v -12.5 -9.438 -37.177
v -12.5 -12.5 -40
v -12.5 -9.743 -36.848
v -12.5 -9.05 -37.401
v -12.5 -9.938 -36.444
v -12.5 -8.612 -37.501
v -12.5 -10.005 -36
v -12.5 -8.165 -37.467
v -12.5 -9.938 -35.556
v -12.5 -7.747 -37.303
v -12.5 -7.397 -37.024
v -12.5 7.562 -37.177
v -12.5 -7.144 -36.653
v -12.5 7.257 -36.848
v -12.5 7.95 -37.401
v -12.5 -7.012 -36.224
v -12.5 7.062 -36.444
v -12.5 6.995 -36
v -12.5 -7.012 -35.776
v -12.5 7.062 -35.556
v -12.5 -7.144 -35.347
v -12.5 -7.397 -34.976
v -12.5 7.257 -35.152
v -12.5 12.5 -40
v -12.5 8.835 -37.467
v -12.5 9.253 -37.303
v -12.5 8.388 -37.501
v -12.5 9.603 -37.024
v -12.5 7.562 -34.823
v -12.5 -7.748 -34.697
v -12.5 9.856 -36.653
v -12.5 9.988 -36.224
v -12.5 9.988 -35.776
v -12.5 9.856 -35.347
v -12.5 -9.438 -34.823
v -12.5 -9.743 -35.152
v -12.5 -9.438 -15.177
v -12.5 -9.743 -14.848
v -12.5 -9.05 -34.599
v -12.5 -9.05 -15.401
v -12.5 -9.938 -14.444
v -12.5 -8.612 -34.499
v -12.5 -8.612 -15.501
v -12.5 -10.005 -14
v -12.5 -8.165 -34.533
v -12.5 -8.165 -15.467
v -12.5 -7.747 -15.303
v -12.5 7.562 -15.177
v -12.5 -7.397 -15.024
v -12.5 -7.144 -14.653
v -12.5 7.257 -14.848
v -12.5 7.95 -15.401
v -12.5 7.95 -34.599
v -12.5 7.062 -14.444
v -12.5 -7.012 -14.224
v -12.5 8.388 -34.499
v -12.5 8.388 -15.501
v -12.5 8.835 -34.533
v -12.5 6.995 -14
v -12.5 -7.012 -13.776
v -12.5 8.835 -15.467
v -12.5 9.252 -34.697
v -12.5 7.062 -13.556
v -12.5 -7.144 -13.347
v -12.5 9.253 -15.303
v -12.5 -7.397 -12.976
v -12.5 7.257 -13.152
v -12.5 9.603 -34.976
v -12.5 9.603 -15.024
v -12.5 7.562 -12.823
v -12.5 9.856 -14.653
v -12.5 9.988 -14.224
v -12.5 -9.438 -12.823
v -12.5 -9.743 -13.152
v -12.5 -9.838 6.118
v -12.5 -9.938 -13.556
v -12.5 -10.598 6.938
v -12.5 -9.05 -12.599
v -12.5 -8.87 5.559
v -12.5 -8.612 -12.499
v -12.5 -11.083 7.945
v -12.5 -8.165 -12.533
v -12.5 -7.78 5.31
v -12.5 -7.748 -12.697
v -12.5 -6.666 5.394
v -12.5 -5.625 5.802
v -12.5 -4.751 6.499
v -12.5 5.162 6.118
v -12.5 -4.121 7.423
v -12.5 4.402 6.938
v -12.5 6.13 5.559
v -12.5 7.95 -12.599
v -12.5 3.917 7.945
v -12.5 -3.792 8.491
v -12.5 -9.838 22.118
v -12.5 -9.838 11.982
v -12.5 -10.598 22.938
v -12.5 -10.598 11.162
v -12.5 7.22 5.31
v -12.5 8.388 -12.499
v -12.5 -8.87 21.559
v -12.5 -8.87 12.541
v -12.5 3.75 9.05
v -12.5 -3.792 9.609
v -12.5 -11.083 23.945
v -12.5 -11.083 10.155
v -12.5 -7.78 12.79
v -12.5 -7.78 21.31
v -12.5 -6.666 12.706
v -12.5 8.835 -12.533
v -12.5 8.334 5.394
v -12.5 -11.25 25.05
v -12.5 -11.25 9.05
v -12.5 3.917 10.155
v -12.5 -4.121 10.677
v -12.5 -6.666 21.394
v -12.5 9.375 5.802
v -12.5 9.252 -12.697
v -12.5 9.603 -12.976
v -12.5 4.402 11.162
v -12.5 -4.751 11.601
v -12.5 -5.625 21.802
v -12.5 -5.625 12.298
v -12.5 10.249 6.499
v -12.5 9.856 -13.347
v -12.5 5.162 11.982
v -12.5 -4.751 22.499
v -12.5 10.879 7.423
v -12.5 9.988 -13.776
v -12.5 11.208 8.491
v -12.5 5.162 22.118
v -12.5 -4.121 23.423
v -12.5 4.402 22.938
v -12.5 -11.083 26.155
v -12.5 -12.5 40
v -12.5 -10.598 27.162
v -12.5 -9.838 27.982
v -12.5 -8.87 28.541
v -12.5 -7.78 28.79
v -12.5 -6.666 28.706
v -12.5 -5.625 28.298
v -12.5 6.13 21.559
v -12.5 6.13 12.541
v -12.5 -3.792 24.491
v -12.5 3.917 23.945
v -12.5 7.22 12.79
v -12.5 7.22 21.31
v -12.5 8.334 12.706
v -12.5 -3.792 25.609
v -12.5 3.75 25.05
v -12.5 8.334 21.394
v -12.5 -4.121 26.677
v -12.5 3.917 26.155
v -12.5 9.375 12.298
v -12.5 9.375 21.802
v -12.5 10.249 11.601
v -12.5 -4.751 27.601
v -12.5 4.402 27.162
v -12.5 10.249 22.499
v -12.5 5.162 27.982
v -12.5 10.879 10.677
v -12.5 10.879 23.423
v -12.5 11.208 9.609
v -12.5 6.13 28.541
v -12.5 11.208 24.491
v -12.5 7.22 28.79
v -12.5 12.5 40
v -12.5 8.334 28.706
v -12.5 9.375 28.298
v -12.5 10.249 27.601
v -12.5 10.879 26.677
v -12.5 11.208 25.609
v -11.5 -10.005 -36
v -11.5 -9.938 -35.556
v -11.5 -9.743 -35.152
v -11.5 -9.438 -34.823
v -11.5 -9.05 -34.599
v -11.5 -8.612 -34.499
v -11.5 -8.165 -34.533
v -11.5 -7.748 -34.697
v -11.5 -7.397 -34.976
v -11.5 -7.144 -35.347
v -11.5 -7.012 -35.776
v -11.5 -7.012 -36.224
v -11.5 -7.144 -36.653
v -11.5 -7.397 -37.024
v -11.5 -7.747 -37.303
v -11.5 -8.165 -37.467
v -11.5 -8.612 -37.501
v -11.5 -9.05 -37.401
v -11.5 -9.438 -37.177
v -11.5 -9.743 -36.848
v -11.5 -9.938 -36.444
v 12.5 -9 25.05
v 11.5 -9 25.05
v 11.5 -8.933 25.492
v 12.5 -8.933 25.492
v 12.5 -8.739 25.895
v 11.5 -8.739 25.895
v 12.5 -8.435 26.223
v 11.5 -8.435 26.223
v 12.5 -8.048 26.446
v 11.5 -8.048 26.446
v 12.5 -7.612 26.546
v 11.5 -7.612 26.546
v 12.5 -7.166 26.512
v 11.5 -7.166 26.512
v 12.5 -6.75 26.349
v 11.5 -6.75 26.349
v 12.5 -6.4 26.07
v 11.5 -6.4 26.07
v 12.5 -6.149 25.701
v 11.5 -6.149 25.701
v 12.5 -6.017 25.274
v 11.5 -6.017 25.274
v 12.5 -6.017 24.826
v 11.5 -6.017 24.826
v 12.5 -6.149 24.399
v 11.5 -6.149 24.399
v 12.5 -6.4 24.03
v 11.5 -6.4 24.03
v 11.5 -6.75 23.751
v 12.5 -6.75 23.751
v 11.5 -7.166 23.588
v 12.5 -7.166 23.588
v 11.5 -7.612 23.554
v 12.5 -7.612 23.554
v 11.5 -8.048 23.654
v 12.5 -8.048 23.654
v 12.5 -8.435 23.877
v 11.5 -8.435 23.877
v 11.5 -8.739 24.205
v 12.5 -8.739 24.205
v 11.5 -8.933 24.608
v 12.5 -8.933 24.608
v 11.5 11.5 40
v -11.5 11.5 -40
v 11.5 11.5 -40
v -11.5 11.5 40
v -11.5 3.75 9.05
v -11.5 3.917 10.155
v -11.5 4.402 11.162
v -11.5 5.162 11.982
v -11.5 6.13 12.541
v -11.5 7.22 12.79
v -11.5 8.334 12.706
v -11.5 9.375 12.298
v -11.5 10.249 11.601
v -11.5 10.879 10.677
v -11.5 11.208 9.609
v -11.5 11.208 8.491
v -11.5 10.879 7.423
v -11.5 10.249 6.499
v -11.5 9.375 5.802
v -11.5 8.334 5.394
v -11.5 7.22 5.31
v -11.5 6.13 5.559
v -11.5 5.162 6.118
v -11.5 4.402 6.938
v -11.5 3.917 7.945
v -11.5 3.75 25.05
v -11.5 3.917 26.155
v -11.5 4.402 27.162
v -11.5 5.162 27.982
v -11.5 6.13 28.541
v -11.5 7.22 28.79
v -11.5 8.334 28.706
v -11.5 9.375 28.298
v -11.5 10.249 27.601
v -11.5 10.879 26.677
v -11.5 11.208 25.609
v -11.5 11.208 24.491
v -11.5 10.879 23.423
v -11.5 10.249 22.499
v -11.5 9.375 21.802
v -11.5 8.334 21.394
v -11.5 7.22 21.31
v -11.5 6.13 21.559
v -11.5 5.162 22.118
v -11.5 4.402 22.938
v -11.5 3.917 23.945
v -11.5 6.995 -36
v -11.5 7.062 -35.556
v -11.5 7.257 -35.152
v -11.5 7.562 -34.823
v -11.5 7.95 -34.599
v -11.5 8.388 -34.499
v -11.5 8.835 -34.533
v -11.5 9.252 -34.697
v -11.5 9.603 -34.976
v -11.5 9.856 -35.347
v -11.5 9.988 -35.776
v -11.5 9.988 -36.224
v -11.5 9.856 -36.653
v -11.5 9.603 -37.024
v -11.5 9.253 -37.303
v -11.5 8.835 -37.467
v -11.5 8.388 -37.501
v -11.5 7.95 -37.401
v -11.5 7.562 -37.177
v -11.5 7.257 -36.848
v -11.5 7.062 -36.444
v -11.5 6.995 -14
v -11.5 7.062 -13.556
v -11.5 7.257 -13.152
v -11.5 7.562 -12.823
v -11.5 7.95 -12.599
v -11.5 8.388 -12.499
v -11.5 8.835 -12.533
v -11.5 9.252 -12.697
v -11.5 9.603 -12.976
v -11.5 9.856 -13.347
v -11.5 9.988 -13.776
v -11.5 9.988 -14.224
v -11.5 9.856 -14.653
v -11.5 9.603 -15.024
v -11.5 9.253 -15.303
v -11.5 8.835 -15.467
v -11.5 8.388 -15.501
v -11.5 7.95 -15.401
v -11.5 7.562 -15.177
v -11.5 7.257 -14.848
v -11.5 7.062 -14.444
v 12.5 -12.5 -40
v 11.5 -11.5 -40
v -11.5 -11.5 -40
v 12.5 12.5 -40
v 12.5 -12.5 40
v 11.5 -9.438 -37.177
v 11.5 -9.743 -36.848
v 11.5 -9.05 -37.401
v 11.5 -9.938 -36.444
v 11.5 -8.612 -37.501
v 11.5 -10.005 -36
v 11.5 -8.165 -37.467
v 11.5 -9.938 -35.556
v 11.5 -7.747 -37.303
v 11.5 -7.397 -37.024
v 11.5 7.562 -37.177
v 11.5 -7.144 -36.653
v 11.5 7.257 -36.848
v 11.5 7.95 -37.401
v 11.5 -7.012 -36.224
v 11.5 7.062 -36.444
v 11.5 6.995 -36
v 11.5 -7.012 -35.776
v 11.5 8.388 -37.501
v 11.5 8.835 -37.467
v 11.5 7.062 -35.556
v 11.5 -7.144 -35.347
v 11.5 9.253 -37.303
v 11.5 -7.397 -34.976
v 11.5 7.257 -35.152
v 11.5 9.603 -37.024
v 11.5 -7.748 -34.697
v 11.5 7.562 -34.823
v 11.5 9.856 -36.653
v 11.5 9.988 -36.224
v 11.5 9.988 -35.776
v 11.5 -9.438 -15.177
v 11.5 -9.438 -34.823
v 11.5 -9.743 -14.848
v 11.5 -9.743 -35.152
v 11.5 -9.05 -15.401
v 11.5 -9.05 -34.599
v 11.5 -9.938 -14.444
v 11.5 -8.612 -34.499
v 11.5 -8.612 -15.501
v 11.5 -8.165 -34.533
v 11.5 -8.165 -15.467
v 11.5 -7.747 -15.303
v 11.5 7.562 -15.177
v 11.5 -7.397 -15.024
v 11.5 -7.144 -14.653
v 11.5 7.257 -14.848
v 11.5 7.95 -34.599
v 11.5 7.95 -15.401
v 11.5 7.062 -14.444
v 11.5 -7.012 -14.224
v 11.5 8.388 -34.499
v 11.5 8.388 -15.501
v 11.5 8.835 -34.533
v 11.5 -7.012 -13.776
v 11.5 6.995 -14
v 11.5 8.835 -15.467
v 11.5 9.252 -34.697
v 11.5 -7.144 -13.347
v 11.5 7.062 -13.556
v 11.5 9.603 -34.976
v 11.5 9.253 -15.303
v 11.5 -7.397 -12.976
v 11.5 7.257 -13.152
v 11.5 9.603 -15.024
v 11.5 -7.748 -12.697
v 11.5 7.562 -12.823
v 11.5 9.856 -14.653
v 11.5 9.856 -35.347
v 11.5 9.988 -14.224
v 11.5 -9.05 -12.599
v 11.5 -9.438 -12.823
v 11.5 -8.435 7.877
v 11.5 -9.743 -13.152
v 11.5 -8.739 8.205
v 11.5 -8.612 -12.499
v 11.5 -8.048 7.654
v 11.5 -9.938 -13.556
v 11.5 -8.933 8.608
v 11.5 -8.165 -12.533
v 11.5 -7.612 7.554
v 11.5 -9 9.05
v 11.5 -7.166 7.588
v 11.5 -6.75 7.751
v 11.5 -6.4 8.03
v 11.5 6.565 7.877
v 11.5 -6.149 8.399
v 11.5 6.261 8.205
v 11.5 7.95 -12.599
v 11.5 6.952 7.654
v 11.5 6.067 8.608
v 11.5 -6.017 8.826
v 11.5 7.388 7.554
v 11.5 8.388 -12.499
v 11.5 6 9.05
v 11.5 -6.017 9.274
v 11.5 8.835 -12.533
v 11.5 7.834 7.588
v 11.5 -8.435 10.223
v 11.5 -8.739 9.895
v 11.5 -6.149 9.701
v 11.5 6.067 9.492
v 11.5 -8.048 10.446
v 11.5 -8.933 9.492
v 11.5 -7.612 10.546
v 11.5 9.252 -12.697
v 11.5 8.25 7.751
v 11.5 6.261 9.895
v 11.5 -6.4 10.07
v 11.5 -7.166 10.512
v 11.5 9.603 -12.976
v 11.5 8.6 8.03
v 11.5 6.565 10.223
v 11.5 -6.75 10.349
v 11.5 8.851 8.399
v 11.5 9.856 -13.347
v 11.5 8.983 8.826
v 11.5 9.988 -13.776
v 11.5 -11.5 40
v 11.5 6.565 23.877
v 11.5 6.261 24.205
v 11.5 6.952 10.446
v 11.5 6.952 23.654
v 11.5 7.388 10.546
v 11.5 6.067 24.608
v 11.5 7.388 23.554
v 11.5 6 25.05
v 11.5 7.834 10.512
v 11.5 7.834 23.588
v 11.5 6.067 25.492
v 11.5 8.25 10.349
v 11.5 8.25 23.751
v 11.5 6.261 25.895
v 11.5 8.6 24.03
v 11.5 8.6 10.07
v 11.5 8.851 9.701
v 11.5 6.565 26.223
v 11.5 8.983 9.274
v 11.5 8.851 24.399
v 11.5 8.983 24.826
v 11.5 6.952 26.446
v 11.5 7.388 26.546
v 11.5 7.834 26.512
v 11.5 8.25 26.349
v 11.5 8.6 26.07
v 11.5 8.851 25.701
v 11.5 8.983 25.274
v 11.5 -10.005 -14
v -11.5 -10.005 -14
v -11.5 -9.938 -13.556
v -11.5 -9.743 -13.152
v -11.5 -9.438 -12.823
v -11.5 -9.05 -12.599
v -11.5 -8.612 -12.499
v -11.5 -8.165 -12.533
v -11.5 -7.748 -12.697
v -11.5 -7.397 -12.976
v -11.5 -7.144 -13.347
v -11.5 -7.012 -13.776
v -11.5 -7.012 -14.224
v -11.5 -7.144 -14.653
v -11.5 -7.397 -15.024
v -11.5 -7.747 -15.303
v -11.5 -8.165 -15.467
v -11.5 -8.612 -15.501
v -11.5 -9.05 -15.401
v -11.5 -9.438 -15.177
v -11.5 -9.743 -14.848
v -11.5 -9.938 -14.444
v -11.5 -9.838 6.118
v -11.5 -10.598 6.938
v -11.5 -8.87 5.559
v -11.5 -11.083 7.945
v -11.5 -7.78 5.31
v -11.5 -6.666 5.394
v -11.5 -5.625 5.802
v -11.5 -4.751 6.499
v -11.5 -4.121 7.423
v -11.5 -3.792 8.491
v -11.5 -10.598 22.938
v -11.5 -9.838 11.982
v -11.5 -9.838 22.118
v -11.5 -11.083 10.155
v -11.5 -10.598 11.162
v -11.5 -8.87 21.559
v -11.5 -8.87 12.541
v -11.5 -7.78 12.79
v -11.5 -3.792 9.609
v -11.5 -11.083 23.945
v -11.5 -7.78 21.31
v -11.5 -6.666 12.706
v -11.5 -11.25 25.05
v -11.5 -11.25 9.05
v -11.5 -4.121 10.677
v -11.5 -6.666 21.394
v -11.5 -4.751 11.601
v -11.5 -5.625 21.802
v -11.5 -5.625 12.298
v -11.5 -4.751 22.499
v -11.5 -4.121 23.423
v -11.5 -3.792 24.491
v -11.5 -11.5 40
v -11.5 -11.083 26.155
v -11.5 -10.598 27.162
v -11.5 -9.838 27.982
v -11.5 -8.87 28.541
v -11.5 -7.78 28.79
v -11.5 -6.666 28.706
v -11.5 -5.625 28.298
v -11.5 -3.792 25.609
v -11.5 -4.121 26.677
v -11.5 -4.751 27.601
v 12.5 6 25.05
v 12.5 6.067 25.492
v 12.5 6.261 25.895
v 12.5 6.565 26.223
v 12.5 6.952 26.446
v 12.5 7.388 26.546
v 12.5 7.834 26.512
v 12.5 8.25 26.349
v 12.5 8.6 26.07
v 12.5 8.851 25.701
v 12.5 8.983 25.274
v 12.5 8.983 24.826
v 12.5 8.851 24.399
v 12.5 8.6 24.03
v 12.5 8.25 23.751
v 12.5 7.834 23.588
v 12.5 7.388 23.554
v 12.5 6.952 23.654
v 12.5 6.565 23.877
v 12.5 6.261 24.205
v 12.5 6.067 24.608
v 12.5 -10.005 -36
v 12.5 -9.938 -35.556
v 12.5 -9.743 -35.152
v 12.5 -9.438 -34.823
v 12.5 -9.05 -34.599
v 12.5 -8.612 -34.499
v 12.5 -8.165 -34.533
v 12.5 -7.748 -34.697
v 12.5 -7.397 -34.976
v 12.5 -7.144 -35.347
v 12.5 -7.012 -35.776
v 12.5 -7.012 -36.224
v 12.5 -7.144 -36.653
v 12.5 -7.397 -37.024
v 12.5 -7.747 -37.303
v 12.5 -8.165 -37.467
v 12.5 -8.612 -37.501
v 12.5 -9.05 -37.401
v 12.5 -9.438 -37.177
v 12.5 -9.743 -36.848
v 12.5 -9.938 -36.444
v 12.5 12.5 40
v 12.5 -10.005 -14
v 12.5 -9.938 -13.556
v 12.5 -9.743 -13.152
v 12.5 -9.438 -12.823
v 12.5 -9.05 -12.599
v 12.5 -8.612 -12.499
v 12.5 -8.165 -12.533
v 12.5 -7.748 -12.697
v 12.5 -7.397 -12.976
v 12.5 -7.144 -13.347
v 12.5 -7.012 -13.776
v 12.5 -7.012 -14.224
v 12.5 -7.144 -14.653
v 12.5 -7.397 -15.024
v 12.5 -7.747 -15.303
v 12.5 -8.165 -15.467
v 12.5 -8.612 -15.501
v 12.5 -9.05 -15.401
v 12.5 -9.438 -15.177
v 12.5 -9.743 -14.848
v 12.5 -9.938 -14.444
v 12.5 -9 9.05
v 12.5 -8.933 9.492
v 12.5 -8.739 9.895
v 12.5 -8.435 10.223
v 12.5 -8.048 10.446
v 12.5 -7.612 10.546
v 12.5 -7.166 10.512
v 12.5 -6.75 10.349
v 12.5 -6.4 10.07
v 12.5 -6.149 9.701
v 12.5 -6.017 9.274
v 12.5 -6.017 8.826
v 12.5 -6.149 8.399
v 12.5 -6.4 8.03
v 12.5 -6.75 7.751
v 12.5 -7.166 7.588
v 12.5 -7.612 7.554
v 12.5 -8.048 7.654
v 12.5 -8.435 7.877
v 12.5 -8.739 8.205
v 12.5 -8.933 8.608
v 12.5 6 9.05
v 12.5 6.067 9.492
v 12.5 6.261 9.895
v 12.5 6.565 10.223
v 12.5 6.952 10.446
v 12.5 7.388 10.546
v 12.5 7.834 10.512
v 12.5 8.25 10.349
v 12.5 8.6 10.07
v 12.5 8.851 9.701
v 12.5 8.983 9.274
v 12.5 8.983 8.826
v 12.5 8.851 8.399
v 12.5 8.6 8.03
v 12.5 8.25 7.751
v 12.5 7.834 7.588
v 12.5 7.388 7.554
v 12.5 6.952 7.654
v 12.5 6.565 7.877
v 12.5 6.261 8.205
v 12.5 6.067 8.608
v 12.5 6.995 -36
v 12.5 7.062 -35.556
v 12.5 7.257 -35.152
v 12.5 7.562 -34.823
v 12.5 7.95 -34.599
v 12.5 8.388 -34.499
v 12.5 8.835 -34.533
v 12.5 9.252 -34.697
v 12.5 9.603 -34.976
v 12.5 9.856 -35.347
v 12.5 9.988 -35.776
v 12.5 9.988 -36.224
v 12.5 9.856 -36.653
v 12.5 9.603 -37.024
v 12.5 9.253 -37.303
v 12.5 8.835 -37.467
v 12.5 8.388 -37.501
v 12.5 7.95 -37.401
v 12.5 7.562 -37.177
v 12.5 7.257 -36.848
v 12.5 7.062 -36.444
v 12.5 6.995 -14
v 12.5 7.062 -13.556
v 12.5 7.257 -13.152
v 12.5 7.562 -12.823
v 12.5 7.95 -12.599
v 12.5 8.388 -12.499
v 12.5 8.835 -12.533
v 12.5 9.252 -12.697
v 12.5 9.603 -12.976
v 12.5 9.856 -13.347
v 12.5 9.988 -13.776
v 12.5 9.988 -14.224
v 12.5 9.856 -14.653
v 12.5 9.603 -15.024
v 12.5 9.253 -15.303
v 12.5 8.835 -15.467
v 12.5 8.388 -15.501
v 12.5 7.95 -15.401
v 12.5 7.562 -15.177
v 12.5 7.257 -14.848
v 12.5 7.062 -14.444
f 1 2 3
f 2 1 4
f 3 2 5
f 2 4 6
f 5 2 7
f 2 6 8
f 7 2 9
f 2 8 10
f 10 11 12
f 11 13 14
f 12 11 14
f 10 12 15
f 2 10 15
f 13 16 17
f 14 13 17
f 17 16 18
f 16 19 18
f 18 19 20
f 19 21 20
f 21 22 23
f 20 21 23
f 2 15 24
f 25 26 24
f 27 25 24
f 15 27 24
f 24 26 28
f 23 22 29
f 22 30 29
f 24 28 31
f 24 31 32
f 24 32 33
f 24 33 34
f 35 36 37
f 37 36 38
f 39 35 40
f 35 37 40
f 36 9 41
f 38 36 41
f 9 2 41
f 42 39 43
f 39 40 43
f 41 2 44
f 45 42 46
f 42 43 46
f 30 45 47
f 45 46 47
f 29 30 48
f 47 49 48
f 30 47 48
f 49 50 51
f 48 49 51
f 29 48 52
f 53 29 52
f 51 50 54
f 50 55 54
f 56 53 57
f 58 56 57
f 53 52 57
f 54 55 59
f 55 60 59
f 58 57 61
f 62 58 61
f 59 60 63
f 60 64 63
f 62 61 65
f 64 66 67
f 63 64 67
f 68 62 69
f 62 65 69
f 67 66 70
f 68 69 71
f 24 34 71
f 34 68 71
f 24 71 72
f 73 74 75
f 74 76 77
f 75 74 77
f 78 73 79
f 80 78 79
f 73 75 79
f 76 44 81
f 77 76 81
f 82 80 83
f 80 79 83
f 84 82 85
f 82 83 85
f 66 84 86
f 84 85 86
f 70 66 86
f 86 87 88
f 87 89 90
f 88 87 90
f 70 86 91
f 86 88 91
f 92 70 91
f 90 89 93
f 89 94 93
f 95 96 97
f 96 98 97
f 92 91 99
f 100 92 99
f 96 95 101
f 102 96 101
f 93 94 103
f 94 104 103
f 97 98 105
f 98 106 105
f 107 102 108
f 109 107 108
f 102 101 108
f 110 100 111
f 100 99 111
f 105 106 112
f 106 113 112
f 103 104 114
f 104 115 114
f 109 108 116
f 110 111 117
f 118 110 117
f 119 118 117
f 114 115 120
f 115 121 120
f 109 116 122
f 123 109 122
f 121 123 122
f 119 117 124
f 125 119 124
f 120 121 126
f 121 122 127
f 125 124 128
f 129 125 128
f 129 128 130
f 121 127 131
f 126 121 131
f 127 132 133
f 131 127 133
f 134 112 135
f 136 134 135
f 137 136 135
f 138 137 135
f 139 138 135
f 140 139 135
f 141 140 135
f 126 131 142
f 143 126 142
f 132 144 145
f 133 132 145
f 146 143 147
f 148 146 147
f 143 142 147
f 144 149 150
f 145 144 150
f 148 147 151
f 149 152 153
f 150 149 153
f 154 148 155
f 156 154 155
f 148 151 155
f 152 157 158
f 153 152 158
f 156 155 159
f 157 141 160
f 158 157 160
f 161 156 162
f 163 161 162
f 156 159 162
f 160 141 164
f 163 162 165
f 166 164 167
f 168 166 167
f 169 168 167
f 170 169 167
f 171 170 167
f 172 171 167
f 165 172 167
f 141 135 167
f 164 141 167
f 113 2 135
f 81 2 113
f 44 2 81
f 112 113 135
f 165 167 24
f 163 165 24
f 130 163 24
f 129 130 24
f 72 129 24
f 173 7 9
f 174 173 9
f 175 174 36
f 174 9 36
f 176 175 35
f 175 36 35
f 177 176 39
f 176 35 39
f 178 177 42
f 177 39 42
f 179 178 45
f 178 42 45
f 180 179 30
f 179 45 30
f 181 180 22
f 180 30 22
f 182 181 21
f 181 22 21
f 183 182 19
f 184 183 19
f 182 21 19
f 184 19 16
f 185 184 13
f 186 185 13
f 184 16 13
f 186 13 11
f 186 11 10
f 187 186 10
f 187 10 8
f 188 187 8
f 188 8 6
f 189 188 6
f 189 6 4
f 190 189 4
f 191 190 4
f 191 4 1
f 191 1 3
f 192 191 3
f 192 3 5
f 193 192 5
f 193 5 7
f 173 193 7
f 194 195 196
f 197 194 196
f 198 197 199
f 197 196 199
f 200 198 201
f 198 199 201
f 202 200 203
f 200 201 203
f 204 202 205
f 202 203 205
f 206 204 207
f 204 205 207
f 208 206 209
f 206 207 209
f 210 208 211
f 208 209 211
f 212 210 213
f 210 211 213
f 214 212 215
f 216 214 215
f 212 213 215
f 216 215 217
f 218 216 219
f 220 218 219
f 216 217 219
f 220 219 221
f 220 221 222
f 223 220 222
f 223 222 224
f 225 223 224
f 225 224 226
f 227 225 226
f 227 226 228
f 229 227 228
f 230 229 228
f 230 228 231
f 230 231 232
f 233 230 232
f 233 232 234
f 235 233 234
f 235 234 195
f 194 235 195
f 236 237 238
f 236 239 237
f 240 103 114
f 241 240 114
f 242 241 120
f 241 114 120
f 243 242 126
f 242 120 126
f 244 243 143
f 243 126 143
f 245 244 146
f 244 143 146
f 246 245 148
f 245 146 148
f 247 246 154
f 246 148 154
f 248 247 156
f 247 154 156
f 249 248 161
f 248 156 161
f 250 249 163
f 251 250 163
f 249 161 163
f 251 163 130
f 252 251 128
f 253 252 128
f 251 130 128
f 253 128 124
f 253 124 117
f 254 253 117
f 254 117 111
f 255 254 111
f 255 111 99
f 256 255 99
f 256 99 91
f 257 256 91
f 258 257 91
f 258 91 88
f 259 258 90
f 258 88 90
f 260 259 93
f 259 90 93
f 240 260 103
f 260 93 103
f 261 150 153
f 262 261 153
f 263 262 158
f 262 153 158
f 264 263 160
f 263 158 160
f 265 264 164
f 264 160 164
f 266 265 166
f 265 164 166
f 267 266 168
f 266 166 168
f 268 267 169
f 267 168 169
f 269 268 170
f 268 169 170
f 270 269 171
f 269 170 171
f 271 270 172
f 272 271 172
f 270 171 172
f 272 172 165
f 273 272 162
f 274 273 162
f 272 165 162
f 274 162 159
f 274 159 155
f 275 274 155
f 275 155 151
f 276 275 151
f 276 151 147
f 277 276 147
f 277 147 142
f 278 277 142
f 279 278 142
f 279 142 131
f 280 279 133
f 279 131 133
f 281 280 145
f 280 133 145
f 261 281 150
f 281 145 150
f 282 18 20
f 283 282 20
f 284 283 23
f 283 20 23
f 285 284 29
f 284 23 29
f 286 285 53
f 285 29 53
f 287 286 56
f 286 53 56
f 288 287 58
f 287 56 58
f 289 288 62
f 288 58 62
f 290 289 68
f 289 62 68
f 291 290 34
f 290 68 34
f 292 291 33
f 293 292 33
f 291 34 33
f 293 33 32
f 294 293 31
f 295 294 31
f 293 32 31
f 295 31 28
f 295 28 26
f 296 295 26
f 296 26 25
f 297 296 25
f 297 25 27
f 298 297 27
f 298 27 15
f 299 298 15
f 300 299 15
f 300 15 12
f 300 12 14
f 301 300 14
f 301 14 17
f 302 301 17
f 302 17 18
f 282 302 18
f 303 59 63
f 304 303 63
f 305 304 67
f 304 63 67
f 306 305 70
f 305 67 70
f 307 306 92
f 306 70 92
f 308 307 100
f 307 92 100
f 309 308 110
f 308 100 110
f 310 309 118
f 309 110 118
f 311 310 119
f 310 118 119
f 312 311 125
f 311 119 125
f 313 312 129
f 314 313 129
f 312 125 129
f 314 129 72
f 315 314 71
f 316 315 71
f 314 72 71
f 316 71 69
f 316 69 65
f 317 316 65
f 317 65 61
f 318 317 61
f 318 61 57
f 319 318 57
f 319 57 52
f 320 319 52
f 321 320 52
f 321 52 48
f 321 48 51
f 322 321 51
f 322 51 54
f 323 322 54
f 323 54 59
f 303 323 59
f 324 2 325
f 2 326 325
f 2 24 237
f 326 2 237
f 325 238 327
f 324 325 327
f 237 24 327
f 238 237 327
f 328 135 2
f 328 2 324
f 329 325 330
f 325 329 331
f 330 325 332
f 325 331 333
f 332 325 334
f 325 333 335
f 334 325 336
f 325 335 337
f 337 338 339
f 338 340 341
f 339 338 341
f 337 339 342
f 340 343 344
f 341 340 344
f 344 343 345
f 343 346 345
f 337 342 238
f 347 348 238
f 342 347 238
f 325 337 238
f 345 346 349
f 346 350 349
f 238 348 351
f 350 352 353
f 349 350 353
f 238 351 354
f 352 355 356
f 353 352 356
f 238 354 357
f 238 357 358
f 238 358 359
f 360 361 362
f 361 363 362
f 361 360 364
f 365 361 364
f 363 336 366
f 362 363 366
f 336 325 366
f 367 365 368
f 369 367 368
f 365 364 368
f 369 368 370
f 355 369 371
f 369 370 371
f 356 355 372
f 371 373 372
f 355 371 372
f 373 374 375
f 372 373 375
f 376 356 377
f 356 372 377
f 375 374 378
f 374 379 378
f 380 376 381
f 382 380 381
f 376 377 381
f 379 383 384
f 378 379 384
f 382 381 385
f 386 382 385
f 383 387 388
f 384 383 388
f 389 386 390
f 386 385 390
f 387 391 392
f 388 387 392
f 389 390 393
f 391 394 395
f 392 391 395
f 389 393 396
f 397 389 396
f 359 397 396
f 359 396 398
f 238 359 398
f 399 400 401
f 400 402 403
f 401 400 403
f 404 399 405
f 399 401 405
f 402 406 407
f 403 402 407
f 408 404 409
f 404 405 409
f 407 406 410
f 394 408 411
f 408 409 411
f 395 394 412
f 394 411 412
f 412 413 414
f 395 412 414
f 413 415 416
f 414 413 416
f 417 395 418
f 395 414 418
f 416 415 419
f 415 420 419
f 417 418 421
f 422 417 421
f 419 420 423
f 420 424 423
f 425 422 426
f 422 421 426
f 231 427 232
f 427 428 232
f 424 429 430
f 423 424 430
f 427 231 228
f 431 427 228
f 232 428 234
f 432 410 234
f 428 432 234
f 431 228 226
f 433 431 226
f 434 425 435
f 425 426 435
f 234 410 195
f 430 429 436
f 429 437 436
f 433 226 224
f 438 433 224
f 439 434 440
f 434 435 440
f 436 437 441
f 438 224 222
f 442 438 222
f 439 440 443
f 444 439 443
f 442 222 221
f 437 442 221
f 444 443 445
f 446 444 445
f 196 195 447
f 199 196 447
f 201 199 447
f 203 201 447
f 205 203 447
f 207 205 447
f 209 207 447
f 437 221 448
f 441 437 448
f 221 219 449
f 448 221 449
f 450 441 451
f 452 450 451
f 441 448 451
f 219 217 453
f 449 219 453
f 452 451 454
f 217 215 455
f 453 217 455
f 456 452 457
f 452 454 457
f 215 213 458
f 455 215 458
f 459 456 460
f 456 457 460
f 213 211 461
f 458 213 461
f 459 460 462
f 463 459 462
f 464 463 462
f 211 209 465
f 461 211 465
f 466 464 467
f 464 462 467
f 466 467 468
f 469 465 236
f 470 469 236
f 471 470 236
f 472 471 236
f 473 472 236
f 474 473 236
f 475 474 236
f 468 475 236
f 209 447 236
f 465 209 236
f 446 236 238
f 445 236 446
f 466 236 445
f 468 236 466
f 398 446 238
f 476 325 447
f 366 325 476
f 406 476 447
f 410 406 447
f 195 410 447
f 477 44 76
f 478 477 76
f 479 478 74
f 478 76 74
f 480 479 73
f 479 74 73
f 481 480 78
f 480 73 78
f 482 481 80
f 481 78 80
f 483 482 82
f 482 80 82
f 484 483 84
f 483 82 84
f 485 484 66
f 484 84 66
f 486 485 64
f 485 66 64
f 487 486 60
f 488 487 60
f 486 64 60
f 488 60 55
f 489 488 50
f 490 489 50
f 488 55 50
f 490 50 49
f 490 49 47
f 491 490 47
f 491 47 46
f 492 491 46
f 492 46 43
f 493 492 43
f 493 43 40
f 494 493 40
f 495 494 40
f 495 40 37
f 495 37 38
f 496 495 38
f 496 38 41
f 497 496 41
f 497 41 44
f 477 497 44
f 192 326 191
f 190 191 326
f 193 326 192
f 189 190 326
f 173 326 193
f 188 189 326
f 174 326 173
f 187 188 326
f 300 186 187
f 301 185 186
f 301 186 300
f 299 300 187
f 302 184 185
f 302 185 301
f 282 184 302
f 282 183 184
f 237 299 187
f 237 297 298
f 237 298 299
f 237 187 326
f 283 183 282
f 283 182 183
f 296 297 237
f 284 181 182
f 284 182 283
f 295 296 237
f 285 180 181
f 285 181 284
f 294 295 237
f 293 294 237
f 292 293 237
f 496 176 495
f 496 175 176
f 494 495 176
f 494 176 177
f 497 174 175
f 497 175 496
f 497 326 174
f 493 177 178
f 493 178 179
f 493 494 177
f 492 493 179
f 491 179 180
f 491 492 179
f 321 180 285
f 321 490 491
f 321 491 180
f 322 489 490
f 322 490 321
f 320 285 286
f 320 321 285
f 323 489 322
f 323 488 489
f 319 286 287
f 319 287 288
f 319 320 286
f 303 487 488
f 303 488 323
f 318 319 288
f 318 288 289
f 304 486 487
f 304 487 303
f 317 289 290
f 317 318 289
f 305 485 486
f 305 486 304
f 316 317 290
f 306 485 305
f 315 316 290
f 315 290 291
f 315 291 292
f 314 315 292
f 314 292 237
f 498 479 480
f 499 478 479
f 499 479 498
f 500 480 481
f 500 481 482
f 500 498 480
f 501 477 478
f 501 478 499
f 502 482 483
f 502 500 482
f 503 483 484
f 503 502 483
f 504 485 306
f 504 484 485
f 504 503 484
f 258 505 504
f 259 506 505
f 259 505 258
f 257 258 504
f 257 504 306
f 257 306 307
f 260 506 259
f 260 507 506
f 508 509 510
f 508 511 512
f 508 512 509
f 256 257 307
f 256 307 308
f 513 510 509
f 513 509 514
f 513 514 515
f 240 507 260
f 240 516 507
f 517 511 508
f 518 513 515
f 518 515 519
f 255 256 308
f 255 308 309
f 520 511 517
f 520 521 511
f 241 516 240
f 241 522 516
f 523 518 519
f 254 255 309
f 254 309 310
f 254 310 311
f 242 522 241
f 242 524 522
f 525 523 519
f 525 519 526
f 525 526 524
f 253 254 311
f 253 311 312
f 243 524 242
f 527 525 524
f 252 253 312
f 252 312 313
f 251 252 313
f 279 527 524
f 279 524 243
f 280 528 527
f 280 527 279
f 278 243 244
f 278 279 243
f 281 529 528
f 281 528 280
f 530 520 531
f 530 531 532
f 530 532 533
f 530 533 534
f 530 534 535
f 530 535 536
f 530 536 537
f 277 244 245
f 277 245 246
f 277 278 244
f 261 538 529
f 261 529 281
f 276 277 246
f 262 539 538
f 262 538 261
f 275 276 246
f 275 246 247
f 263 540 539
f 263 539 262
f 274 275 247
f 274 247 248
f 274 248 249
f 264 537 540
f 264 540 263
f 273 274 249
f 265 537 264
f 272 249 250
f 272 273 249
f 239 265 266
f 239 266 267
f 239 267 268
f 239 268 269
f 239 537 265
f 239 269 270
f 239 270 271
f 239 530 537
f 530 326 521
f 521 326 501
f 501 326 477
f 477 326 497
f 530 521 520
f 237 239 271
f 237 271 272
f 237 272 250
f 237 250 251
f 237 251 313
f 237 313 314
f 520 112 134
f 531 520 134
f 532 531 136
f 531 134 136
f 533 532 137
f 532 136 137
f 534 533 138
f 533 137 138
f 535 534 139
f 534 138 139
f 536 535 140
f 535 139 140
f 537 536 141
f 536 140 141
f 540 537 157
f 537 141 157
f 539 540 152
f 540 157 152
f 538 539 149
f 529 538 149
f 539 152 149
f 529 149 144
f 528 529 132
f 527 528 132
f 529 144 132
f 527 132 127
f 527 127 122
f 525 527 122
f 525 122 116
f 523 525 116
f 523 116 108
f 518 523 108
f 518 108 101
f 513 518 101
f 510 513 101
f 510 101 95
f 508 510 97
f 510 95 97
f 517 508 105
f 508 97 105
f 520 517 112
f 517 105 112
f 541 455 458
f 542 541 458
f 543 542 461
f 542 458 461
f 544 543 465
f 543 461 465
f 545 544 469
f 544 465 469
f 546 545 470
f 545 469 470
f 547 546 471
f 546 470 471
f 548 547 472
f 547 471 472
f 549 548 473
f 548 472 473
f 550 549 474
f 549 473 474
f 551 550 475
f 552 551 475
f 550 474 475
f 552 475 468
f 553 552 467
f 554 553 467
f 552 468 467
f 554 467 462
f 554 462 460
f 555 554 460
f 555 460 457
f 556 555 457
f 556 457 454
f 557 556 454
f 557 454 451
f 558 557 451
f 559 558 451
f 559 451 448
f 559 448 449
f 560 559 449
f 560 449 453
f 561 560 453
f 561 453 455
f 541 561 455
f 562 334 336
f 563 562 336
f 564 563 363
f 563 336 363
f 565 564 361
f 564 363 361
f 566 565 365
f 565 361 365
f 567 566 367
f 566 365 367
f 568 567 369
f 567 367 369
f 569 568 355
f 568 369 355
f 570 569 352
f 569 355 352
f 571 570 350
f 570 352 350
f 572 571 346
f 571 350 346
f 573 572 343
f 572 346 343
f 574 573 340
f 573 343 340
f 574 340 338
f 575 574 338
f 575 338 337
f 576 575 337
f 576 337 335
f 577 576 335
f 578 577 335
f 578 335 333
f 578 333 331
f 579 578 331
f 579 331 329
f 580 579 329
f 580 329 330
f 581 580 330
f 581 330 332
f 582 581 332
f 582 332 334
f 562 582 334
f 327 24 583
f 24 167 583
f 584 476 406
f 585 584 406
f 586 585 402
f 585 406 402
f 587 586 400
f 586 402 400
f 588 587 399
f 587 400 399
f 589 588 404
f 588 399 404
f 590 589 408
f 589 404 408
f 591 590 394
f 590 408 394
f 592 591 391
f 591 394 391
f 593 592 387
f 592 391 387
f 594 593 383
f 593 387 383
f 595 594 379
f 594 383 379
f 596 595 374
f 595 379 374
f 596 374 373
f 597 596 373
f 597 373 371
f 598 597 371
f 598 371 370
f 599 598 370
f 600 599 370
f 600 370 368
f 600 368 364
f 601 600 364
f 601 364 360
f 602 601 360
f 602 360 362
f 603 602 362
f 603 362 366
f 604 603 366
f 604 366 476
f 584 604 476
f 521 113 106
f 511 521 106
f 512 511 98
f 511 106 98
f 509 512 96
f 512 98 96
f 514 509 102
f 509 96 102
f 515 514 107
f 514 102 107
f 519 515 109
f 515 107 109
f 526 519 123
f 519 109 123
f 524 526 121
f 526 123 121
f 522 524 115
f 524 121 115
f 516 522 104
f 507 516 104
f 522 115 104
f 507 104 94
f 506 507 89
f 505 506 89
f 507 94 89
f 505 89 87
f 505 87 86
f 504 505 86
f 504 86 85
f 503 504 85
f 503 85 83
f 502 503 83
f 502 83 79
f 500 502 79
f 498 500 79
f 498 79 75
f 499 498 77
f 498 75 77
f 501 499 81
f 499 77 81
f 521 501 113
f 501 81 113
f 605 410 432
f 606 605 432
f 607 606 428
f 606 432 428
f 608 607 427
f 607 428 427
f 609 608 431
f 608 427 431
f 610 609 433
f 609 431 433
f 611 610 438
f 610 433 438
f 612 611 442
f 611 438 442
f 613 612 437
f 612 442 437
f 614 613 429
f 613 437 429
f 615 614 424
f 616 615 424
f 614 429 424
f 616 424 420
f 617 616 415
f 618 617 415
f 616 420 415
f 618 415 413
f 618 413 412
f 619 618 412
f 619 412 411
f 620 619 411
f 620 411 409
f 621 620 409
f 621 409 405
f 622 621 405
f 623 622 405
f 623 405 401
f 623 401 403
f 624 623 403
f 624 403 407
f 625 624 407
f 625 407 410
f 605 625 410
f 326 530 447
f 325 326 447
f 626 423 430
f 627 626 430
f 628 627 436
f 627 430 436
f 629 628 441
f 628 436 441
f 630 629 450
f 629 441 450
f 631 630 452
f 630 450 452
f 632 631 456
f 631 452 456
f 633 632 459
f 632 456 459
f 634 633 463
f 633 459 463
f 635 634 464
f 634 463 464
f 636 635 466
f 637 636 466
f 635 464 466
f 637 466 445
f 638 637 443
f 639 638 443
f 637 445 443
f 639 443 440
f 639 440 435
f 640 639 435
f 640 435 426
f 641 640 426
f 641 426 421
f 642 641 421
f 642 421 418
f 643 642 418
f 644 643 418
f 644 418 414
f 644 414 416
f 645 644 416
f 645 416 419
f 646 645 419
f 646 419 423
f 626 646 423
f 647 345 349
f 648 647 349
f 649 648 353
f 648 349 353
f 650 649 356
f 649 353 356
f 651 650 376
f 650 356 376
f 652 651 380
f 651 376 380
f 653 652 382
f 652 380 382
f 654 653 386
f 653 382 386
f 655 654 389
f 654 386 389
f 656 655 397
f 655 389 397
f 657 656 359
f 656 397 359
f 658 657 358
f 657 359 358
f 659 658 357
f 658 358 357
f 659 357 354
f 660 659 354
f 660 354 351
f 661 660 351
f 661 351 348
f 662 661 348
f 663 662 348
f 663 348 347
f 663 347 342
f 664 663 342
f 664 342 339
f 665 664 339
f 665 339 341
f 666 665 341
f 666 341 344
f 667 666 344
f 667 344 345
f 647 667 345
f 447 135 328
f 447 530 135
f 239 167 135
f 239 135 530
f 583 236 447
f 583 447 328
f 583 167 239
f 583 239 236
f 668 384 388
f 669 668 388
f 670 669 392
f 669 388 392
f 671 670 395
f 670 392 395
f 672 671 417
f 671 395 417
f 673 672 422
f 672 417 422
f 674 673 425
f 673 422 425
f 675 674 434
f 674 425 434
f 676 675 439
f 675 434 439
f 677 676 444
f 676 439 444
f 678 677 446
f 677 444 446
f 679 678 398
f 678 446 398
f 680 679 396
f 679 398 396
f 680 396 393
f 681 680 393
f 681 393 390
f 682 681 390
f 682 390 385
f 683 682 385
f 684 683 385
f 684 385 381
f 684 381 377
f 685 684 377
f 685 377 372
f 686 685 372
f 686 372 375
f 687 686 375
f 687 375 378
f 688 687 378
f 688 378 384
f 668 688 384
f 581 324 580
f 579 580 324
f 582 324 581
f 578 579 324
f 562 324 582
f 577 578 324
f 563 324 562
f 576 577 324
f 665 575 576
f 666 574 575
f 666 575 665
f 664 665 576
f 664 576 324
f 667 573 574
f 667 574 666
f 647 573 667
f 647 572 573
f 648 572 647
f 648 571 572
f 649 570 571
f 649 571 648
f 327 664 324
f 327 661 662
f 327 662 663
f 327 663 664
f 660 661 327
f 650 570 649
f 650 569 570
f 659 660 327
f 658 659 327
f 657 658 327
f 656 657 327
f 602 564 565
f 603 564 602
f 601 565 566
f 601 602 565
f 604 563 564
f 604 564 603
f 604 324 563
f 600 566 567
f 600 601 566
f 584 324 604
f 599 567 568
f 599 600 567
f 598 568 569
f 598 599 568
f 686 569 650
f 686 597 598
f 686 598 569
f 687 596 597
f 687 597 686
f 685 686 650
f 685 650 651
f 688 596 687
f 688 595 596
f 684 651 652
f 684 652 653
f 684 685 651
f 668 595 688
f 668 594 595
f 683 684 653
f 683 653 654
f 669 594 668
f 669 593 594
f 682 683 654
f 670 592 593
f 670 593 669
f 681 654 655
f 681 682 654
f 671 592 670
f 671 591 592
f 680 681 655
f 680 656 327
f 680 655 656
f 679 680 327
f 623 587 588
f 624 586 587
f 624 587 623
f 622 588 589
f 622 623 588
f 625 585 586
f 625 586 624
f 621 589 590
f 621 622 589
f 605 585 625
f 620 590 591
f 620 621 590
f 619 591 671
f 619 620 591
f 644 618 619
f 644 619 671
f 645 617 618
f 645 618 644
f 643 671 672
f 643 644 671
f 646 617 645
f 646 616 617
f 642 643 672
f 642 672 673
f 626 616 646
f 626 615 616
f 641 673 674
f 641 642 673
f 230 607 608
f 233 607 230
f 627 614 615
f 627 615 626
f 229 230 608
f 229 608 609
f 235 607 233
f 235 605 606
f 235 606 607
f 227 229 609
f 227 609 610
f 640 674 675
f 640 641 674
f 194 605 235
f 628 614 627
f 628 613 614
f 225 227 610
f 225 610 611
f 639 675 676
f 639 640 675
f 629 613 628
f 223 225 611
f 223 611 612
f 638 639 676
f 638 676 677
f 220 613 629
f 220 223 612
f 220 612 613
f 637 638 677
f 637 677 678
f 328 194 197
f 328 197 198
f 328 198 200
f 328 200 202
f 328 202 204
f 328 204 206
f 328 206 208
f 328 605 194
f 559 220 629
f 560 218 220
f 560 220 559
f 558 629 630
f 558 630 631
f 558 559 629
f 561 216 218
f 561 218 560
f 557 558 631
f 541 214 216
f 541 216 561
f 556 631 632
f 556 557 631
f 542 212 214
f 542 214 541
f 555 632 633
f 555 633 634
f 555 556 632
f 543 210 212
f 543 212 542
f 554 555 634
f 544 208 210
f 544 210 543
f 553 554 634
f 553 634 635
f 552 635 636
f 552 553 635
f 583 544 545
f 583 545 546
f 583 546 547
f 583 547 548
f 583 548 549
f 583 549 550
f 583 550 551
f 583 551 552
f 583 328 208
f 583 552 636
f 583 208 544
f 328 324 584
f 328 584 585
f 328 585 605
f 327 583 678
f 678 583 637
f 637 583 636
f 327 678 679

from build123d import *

# Parameters (mm, degrees)
SKETCH_1_W           = 25
SKETCH_1_H           = 25
SKETCH_1_W_2         = 23
SKETCH_1_H_2         = 23
EXTRUDE_1_DEPTH      = 40
SKETCH_4_R           = 1.5
CUT_EXTRUDE_3_DEPTH  = 10
SKETCH_17_R          = 3.75
CUT_EXTRUDE_16_DEPTH = 1
CUT_EXTRUDE_17_REACH = 50.798
SKETCH_18_R          = 1.505


with BuildPart() as part:
    # 草图1 → 凸台-拉伸1 (new, symmetric)
    with BuildSketch(Plane.XY):
        Rectangle(SKETCH_1_W, SKETCH_1_H)
        Rectangle(SKETCH_1_W_2, SKETCH_1_H_2, mode=Mode.SUBTRACT)
    extrude(amount=EXTRUDE_1_DEPTH, both=True)

    # 草图4 → 切除-拉伸3 (cut)
    with BuildSketch(Plane.ZY.offset(-11.5)):
        with Locations(Location((25.05, -7.5, 0), (0, 0, 270))):
            Circle(SKETCH_4_R)
        with Locations(Location((25.05, 7.5, 0), (0, 0, 270))):
            Circle(SKETCH_4_R)
        with Locations(Location((9.05, 7.5, 0), (0, 0, 270))):
            Circle(SKETCH_4_R)
        with Locations(Location((9.05, -7.5, 0), (0, 0, 270))):
            Circle(SKETCH_4_R)
    extrude(amount=-CUT_EXTRUDE_3_DEPTH, mode=Mode.SUBTRACT)

    # 草图17 → 切除-拉伸16 (cut)
    with BuildSketch(Plane.ZY.offset(12.5)):
        with Locations(Location((25.05, 7.5, 0), (0, 0, 270))):
            Circle(SKETCH_17_R)
        with Locations(Location((9.05, 7.5, 0), (0, 0, 270))):
            Circle(SKETCH_17_R)
        with Locations(Location((25.05, -7.5, 0), (0, 0, 270))):
            Circle(SKETCH_17_R)
        with Locations(Location((9.05, -7.5, 0), (0, 0, 270))):
            Circle(SKETCH_17_R)
    extrude(amount=-CUT_EXTRUDE_16_DEPTH, mode=Mode.SUBTRACT)

    # 切除-拉伸17: up to this face of the body (flat: up to its plane)
    cut_extrude_17_end = Plane(part.part.faces().sort_by_distance((12.5, 0, -0.244495165))[0])
    # 草图18 → 切除-拉伸17 (cut, up to the picked face)
    with BuildSketch(Plane.ZY.offset(12.5), mode=Mode.PRIVATE) as cut_extrude_17_sk1:
        with Locations(Location((-36, 8.5, 0), (0, 0, 270))):
            Circle(SKETCH_18_R)
    cut_extrude_17_tool1 = split(extrude(cut_extrude_17_sk1.sketch, amount=-CUT_EXTRUDE_17_REACH, mode=Mode.PRIVATE), bisect_by=cut_extrude_17_end, keep=Keep.BOTH, mode=Mode.PRIVATE)
    # 草图18 → 切除-拉伸17 (cut, up to the picked face)
    with BuildSketch(Plane.ZY.offset(12.5), mode=Mode.PRIVATE) as cut_extrude_17_sk2:
        with Locations(Location((-14, 8.5, 0), (0, 0, 270))):
            Circle(SKETCH_18_R)
    cut_extrude_17_tool2 = split(extrude(cut_extrude_17_sk2.sketch, amount=-CUT_EXTRUDE_17_REACH, mode=Mode.PRIVATE), bisect_by=cut_extrude_17_end, keep=Keep.BOTH, mode=Mode.PRIVATE)
    # 草图18 → 切除-拉伸17 (cut, up to the picked face)
    with BuildSketch(Plane.ZY.offset(12.5), mode=Mode.PRIVATE) as cut_extrude_17_sk3:
        with Locations(Location((-14, -8.5, 0), (0, 0, 270))):
            Circle(SKETCH_18_R)
    cut_extrude_17_tool3 = split(extrude(cut_extrude_17_sk3.sketch, amount=-CUT_EXTRUDE_17_REACH, mode=Mode.PRIVATE), bisect_by=cut_extrude_17_end, keep=Keep.BOTH, mode=Mode.PRIVATE)
    # 草图18 → 切除-拉伸17 (cut, up to the picked face)
    with BuildSketch(Plane.ZY.offset(12.5), mode=Mode.PRIVATE) as cut_extrude_17_sk4:
        with Locations(Location((-36, -8.5, 0), (0, 0, 270))):
            Circle(SKETCH_18_R)
    cut_extrude_17_tool4 = split(extrude(cut_extrude_17_sk4.sketch, amount=-CUT_EXTRUDE_17_REACH, mode=Mode.PRIVATE), bisect_by=cut_extrude_17_end, keep=Keep.BOTH, mode=Mode.PRIVATE)
    add(cut_extrude_17_tool1.solids().sort_by(Axis((-12.5, 8.5, -36), (1, 0, 0)))[0], mode=Mode.SUBTRACT)
    add(cut_extrude_17_tool2.solids().sort_by(Axis((-12.5, 8.5, -14), (1, 0, 0)))[0], mode=Mode.SUBTRACT)
    add(cut_extrude_17_tool3.solids().sort_by(Axis((-12.5, -8.5, -14), (1, 0, 0)))[0], mode=Mode.SUBTRACT)
    add(cut_extrude_17_tool4.solids().sort_by(Axis((-12.5, -8.5, -36), (1, 0, 0)))[0], mode=Mode.SUBTRACT)


solid = part.part
